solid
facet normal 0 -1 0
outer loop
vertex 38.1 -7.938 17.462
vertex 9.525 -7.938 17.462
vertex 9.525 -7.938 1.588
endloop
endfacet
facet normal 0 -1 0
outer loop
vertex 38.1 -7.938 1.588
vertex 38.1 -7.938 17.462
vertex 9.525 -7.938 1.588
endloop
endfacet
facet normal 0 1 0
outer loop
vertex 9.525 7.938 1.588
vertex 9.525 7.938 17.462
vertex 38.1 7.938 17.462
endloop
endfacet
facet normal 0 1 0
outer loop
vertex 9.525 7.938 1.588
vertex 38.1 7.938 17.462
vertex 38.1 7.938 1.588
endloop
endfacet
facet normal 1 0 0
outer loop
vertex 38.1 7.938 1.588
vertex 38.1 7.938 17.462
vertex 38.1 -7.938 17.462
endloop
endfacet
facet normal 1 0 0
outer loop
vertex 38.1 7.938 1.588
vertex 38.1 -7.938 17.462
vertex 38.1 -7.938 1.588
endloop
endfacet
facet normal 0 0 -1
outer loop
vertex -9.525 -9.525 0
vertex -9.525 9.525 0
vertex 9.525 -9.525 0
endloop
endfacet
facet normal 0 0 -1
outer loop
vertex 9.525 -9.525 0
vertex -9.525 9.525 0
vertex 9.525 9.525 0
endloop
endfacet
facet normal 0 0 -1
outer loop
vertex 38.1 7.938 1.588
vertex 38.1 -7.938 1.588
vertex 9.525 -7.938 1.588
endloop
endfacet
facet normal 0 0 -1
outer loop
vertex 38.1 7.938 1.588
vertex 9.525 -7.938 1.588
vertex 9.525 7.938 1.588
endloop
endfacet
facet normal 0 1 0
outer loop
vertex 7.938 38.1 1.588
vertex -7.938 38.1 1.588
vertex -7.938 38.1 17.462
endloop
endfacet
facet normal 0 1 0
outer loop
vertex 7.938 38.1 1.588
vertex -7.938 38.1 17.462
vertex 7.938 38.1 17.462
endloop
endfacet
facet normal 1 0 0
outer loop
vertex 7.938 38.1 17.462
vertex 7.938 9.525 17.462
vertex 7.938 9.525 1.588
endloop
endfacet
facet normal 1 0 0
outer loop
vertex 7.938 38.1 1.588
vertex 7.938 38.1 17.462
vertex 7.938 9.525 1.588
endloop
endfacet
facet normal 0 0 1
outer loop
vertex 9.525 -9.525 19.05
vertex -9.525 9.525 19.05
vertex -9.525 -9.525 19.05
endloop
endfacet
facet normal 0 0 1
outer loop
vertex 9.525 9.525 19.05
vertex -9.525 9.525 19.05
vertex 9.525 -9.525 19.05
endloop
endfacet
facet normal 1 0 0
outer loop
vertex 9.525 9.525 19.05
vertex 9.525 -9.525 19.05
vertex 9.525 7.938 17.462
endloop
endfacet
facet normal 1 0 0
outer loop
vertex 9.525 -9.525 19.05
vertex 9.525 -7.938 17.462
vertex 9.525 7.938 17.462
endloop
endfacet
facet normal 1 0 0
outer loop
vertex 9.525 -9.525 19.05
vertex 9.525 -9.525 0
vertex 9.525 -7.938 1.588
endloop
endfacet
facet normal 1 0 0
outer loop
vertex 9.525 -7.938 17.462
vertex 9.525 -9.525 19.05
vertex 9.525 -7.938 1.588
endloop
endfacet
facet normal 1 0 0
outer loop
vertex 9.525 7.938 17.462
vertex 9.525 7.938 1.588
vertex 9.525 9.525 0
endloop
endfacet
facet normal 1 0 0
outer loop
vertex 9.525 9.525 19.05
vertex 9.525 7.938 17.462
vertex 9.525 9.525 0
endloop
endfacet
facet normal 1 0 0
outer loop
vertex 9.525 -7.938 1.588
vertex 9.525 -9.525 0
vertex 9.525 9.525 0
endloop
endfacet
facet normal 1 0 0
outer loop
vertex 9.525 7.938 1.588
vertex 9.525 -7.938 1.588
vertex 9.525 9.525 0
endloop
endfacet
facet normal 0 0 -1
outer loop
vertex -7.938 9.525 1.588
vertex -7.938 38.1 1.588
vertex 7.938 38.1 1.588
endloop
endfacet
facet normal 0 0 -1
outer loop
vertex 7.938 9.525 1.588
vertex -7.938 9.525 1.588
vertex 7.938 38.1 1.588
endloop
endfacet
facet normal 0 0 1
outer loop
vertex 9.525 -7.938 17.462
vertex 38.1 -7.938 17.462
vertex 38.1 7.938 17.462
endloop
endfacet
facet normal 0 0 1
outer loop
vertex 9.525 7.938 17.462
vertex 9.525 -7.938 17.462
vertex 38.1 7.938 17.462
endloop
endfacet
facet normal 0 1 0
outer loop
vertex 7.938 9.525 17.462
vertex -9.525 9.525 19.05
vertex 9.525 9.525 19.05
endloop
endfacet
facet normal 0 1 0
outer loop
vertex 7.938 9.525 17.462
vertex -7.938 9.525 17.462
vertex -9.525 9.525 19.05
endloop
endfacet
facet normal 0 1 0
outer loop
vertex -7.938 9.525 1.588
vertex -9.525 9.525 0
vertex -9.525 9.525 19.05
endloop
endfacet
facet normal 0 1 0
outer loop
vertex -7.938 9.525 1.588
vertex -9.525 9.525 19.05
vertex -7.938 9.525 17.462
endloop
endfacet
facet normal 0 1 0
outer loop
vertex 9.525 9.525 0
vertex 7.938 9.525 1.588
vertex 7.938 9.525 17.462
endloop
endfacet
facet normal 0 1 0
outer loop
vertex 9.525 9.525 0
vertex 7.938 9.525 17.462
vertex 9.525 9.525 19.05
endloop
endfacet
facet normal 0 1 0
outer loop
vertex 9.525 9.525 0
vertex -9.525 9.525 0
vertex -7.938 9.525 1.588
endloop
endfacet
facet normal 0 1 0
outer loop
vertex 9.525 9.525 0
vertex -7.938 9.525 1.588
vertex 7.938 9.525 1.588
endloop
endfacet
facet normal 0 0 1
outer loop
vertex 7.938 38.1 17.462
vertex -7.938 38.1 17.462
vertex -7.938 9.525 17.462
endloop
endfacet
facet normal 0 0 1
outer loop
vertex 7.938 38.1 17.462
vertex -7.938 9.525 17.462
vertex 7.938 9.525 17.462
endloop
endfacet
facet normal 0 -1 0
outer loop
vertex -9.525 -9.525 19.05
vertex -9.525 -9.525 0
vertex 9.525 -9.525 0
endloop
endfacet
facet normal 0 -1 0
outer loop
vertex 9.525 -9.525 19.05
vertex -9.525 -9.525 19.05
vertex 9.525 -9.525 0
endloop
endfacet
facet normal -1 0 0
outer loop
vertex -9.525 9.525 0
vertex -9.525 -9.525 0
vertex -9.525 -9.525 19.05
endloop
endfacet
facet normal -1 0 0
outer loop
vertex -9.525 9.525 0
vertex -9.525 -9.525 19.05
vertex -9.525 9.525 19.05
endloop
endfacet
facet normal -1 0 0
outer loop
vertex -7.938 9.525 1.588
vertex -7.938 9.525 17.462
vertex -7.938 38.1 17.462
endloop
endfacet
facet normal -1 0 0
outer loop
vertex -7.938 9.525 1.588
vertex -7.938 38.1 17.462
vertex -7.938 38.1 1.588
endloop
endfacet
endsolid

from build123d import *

# Parameters (mm, degrees)
SKETCH1_W           = 19.05
SKETCH1_H           = 19.05
BOSS_EXTRUDE1_DEPTH = 19.05
SKETCH2_W           = 15.875
SKETCH2_H           = 15.875
BOSS_EXTRUDE2_DEPTH = 28.575
SKETCH3_W           = 15.875
SKETCH3_H           = 15.875
BOSS_EXTRUDE3_DEPTH = 28.575


with BuildPart() as part:
    # Sketch1 → Boss-Extrude1 (new body)
    with BuildSketch(Plane.XY):
        Rectangle(SKETCH1_W, SKETCH1_H)
    extrude(amount=BOSS_EXTRUDE1_DEPTH)

    # Sketch2 → Boss-Extrude2 (add)
    with BuildSketch(Plane(origin=(0, 9.525, 0), x_dir=(1, 0, 0), z_dir=(0, 1, 0))):
        with Locations((0, -9.525)):
            Rectangle(SKETCH2_W, SKETCH2_H)
    extrude(amount=BOSS_EXTRUDE2_DEPTH)

    # Sketch3 → Boss-Extrude3 (add)
    with BuildSketch(Plane(origin=(9.525, 0, 0), x_dir=(0, 0, -1), z_dir=(1, 0, 0))):
        with Locations((-9.525, 0)):
            Rectangle(SKETCH3_W, SKETCH3_H)
    extrude(amount=BOSS_EXTRUDE3_DEPTH)


solid = part.part
